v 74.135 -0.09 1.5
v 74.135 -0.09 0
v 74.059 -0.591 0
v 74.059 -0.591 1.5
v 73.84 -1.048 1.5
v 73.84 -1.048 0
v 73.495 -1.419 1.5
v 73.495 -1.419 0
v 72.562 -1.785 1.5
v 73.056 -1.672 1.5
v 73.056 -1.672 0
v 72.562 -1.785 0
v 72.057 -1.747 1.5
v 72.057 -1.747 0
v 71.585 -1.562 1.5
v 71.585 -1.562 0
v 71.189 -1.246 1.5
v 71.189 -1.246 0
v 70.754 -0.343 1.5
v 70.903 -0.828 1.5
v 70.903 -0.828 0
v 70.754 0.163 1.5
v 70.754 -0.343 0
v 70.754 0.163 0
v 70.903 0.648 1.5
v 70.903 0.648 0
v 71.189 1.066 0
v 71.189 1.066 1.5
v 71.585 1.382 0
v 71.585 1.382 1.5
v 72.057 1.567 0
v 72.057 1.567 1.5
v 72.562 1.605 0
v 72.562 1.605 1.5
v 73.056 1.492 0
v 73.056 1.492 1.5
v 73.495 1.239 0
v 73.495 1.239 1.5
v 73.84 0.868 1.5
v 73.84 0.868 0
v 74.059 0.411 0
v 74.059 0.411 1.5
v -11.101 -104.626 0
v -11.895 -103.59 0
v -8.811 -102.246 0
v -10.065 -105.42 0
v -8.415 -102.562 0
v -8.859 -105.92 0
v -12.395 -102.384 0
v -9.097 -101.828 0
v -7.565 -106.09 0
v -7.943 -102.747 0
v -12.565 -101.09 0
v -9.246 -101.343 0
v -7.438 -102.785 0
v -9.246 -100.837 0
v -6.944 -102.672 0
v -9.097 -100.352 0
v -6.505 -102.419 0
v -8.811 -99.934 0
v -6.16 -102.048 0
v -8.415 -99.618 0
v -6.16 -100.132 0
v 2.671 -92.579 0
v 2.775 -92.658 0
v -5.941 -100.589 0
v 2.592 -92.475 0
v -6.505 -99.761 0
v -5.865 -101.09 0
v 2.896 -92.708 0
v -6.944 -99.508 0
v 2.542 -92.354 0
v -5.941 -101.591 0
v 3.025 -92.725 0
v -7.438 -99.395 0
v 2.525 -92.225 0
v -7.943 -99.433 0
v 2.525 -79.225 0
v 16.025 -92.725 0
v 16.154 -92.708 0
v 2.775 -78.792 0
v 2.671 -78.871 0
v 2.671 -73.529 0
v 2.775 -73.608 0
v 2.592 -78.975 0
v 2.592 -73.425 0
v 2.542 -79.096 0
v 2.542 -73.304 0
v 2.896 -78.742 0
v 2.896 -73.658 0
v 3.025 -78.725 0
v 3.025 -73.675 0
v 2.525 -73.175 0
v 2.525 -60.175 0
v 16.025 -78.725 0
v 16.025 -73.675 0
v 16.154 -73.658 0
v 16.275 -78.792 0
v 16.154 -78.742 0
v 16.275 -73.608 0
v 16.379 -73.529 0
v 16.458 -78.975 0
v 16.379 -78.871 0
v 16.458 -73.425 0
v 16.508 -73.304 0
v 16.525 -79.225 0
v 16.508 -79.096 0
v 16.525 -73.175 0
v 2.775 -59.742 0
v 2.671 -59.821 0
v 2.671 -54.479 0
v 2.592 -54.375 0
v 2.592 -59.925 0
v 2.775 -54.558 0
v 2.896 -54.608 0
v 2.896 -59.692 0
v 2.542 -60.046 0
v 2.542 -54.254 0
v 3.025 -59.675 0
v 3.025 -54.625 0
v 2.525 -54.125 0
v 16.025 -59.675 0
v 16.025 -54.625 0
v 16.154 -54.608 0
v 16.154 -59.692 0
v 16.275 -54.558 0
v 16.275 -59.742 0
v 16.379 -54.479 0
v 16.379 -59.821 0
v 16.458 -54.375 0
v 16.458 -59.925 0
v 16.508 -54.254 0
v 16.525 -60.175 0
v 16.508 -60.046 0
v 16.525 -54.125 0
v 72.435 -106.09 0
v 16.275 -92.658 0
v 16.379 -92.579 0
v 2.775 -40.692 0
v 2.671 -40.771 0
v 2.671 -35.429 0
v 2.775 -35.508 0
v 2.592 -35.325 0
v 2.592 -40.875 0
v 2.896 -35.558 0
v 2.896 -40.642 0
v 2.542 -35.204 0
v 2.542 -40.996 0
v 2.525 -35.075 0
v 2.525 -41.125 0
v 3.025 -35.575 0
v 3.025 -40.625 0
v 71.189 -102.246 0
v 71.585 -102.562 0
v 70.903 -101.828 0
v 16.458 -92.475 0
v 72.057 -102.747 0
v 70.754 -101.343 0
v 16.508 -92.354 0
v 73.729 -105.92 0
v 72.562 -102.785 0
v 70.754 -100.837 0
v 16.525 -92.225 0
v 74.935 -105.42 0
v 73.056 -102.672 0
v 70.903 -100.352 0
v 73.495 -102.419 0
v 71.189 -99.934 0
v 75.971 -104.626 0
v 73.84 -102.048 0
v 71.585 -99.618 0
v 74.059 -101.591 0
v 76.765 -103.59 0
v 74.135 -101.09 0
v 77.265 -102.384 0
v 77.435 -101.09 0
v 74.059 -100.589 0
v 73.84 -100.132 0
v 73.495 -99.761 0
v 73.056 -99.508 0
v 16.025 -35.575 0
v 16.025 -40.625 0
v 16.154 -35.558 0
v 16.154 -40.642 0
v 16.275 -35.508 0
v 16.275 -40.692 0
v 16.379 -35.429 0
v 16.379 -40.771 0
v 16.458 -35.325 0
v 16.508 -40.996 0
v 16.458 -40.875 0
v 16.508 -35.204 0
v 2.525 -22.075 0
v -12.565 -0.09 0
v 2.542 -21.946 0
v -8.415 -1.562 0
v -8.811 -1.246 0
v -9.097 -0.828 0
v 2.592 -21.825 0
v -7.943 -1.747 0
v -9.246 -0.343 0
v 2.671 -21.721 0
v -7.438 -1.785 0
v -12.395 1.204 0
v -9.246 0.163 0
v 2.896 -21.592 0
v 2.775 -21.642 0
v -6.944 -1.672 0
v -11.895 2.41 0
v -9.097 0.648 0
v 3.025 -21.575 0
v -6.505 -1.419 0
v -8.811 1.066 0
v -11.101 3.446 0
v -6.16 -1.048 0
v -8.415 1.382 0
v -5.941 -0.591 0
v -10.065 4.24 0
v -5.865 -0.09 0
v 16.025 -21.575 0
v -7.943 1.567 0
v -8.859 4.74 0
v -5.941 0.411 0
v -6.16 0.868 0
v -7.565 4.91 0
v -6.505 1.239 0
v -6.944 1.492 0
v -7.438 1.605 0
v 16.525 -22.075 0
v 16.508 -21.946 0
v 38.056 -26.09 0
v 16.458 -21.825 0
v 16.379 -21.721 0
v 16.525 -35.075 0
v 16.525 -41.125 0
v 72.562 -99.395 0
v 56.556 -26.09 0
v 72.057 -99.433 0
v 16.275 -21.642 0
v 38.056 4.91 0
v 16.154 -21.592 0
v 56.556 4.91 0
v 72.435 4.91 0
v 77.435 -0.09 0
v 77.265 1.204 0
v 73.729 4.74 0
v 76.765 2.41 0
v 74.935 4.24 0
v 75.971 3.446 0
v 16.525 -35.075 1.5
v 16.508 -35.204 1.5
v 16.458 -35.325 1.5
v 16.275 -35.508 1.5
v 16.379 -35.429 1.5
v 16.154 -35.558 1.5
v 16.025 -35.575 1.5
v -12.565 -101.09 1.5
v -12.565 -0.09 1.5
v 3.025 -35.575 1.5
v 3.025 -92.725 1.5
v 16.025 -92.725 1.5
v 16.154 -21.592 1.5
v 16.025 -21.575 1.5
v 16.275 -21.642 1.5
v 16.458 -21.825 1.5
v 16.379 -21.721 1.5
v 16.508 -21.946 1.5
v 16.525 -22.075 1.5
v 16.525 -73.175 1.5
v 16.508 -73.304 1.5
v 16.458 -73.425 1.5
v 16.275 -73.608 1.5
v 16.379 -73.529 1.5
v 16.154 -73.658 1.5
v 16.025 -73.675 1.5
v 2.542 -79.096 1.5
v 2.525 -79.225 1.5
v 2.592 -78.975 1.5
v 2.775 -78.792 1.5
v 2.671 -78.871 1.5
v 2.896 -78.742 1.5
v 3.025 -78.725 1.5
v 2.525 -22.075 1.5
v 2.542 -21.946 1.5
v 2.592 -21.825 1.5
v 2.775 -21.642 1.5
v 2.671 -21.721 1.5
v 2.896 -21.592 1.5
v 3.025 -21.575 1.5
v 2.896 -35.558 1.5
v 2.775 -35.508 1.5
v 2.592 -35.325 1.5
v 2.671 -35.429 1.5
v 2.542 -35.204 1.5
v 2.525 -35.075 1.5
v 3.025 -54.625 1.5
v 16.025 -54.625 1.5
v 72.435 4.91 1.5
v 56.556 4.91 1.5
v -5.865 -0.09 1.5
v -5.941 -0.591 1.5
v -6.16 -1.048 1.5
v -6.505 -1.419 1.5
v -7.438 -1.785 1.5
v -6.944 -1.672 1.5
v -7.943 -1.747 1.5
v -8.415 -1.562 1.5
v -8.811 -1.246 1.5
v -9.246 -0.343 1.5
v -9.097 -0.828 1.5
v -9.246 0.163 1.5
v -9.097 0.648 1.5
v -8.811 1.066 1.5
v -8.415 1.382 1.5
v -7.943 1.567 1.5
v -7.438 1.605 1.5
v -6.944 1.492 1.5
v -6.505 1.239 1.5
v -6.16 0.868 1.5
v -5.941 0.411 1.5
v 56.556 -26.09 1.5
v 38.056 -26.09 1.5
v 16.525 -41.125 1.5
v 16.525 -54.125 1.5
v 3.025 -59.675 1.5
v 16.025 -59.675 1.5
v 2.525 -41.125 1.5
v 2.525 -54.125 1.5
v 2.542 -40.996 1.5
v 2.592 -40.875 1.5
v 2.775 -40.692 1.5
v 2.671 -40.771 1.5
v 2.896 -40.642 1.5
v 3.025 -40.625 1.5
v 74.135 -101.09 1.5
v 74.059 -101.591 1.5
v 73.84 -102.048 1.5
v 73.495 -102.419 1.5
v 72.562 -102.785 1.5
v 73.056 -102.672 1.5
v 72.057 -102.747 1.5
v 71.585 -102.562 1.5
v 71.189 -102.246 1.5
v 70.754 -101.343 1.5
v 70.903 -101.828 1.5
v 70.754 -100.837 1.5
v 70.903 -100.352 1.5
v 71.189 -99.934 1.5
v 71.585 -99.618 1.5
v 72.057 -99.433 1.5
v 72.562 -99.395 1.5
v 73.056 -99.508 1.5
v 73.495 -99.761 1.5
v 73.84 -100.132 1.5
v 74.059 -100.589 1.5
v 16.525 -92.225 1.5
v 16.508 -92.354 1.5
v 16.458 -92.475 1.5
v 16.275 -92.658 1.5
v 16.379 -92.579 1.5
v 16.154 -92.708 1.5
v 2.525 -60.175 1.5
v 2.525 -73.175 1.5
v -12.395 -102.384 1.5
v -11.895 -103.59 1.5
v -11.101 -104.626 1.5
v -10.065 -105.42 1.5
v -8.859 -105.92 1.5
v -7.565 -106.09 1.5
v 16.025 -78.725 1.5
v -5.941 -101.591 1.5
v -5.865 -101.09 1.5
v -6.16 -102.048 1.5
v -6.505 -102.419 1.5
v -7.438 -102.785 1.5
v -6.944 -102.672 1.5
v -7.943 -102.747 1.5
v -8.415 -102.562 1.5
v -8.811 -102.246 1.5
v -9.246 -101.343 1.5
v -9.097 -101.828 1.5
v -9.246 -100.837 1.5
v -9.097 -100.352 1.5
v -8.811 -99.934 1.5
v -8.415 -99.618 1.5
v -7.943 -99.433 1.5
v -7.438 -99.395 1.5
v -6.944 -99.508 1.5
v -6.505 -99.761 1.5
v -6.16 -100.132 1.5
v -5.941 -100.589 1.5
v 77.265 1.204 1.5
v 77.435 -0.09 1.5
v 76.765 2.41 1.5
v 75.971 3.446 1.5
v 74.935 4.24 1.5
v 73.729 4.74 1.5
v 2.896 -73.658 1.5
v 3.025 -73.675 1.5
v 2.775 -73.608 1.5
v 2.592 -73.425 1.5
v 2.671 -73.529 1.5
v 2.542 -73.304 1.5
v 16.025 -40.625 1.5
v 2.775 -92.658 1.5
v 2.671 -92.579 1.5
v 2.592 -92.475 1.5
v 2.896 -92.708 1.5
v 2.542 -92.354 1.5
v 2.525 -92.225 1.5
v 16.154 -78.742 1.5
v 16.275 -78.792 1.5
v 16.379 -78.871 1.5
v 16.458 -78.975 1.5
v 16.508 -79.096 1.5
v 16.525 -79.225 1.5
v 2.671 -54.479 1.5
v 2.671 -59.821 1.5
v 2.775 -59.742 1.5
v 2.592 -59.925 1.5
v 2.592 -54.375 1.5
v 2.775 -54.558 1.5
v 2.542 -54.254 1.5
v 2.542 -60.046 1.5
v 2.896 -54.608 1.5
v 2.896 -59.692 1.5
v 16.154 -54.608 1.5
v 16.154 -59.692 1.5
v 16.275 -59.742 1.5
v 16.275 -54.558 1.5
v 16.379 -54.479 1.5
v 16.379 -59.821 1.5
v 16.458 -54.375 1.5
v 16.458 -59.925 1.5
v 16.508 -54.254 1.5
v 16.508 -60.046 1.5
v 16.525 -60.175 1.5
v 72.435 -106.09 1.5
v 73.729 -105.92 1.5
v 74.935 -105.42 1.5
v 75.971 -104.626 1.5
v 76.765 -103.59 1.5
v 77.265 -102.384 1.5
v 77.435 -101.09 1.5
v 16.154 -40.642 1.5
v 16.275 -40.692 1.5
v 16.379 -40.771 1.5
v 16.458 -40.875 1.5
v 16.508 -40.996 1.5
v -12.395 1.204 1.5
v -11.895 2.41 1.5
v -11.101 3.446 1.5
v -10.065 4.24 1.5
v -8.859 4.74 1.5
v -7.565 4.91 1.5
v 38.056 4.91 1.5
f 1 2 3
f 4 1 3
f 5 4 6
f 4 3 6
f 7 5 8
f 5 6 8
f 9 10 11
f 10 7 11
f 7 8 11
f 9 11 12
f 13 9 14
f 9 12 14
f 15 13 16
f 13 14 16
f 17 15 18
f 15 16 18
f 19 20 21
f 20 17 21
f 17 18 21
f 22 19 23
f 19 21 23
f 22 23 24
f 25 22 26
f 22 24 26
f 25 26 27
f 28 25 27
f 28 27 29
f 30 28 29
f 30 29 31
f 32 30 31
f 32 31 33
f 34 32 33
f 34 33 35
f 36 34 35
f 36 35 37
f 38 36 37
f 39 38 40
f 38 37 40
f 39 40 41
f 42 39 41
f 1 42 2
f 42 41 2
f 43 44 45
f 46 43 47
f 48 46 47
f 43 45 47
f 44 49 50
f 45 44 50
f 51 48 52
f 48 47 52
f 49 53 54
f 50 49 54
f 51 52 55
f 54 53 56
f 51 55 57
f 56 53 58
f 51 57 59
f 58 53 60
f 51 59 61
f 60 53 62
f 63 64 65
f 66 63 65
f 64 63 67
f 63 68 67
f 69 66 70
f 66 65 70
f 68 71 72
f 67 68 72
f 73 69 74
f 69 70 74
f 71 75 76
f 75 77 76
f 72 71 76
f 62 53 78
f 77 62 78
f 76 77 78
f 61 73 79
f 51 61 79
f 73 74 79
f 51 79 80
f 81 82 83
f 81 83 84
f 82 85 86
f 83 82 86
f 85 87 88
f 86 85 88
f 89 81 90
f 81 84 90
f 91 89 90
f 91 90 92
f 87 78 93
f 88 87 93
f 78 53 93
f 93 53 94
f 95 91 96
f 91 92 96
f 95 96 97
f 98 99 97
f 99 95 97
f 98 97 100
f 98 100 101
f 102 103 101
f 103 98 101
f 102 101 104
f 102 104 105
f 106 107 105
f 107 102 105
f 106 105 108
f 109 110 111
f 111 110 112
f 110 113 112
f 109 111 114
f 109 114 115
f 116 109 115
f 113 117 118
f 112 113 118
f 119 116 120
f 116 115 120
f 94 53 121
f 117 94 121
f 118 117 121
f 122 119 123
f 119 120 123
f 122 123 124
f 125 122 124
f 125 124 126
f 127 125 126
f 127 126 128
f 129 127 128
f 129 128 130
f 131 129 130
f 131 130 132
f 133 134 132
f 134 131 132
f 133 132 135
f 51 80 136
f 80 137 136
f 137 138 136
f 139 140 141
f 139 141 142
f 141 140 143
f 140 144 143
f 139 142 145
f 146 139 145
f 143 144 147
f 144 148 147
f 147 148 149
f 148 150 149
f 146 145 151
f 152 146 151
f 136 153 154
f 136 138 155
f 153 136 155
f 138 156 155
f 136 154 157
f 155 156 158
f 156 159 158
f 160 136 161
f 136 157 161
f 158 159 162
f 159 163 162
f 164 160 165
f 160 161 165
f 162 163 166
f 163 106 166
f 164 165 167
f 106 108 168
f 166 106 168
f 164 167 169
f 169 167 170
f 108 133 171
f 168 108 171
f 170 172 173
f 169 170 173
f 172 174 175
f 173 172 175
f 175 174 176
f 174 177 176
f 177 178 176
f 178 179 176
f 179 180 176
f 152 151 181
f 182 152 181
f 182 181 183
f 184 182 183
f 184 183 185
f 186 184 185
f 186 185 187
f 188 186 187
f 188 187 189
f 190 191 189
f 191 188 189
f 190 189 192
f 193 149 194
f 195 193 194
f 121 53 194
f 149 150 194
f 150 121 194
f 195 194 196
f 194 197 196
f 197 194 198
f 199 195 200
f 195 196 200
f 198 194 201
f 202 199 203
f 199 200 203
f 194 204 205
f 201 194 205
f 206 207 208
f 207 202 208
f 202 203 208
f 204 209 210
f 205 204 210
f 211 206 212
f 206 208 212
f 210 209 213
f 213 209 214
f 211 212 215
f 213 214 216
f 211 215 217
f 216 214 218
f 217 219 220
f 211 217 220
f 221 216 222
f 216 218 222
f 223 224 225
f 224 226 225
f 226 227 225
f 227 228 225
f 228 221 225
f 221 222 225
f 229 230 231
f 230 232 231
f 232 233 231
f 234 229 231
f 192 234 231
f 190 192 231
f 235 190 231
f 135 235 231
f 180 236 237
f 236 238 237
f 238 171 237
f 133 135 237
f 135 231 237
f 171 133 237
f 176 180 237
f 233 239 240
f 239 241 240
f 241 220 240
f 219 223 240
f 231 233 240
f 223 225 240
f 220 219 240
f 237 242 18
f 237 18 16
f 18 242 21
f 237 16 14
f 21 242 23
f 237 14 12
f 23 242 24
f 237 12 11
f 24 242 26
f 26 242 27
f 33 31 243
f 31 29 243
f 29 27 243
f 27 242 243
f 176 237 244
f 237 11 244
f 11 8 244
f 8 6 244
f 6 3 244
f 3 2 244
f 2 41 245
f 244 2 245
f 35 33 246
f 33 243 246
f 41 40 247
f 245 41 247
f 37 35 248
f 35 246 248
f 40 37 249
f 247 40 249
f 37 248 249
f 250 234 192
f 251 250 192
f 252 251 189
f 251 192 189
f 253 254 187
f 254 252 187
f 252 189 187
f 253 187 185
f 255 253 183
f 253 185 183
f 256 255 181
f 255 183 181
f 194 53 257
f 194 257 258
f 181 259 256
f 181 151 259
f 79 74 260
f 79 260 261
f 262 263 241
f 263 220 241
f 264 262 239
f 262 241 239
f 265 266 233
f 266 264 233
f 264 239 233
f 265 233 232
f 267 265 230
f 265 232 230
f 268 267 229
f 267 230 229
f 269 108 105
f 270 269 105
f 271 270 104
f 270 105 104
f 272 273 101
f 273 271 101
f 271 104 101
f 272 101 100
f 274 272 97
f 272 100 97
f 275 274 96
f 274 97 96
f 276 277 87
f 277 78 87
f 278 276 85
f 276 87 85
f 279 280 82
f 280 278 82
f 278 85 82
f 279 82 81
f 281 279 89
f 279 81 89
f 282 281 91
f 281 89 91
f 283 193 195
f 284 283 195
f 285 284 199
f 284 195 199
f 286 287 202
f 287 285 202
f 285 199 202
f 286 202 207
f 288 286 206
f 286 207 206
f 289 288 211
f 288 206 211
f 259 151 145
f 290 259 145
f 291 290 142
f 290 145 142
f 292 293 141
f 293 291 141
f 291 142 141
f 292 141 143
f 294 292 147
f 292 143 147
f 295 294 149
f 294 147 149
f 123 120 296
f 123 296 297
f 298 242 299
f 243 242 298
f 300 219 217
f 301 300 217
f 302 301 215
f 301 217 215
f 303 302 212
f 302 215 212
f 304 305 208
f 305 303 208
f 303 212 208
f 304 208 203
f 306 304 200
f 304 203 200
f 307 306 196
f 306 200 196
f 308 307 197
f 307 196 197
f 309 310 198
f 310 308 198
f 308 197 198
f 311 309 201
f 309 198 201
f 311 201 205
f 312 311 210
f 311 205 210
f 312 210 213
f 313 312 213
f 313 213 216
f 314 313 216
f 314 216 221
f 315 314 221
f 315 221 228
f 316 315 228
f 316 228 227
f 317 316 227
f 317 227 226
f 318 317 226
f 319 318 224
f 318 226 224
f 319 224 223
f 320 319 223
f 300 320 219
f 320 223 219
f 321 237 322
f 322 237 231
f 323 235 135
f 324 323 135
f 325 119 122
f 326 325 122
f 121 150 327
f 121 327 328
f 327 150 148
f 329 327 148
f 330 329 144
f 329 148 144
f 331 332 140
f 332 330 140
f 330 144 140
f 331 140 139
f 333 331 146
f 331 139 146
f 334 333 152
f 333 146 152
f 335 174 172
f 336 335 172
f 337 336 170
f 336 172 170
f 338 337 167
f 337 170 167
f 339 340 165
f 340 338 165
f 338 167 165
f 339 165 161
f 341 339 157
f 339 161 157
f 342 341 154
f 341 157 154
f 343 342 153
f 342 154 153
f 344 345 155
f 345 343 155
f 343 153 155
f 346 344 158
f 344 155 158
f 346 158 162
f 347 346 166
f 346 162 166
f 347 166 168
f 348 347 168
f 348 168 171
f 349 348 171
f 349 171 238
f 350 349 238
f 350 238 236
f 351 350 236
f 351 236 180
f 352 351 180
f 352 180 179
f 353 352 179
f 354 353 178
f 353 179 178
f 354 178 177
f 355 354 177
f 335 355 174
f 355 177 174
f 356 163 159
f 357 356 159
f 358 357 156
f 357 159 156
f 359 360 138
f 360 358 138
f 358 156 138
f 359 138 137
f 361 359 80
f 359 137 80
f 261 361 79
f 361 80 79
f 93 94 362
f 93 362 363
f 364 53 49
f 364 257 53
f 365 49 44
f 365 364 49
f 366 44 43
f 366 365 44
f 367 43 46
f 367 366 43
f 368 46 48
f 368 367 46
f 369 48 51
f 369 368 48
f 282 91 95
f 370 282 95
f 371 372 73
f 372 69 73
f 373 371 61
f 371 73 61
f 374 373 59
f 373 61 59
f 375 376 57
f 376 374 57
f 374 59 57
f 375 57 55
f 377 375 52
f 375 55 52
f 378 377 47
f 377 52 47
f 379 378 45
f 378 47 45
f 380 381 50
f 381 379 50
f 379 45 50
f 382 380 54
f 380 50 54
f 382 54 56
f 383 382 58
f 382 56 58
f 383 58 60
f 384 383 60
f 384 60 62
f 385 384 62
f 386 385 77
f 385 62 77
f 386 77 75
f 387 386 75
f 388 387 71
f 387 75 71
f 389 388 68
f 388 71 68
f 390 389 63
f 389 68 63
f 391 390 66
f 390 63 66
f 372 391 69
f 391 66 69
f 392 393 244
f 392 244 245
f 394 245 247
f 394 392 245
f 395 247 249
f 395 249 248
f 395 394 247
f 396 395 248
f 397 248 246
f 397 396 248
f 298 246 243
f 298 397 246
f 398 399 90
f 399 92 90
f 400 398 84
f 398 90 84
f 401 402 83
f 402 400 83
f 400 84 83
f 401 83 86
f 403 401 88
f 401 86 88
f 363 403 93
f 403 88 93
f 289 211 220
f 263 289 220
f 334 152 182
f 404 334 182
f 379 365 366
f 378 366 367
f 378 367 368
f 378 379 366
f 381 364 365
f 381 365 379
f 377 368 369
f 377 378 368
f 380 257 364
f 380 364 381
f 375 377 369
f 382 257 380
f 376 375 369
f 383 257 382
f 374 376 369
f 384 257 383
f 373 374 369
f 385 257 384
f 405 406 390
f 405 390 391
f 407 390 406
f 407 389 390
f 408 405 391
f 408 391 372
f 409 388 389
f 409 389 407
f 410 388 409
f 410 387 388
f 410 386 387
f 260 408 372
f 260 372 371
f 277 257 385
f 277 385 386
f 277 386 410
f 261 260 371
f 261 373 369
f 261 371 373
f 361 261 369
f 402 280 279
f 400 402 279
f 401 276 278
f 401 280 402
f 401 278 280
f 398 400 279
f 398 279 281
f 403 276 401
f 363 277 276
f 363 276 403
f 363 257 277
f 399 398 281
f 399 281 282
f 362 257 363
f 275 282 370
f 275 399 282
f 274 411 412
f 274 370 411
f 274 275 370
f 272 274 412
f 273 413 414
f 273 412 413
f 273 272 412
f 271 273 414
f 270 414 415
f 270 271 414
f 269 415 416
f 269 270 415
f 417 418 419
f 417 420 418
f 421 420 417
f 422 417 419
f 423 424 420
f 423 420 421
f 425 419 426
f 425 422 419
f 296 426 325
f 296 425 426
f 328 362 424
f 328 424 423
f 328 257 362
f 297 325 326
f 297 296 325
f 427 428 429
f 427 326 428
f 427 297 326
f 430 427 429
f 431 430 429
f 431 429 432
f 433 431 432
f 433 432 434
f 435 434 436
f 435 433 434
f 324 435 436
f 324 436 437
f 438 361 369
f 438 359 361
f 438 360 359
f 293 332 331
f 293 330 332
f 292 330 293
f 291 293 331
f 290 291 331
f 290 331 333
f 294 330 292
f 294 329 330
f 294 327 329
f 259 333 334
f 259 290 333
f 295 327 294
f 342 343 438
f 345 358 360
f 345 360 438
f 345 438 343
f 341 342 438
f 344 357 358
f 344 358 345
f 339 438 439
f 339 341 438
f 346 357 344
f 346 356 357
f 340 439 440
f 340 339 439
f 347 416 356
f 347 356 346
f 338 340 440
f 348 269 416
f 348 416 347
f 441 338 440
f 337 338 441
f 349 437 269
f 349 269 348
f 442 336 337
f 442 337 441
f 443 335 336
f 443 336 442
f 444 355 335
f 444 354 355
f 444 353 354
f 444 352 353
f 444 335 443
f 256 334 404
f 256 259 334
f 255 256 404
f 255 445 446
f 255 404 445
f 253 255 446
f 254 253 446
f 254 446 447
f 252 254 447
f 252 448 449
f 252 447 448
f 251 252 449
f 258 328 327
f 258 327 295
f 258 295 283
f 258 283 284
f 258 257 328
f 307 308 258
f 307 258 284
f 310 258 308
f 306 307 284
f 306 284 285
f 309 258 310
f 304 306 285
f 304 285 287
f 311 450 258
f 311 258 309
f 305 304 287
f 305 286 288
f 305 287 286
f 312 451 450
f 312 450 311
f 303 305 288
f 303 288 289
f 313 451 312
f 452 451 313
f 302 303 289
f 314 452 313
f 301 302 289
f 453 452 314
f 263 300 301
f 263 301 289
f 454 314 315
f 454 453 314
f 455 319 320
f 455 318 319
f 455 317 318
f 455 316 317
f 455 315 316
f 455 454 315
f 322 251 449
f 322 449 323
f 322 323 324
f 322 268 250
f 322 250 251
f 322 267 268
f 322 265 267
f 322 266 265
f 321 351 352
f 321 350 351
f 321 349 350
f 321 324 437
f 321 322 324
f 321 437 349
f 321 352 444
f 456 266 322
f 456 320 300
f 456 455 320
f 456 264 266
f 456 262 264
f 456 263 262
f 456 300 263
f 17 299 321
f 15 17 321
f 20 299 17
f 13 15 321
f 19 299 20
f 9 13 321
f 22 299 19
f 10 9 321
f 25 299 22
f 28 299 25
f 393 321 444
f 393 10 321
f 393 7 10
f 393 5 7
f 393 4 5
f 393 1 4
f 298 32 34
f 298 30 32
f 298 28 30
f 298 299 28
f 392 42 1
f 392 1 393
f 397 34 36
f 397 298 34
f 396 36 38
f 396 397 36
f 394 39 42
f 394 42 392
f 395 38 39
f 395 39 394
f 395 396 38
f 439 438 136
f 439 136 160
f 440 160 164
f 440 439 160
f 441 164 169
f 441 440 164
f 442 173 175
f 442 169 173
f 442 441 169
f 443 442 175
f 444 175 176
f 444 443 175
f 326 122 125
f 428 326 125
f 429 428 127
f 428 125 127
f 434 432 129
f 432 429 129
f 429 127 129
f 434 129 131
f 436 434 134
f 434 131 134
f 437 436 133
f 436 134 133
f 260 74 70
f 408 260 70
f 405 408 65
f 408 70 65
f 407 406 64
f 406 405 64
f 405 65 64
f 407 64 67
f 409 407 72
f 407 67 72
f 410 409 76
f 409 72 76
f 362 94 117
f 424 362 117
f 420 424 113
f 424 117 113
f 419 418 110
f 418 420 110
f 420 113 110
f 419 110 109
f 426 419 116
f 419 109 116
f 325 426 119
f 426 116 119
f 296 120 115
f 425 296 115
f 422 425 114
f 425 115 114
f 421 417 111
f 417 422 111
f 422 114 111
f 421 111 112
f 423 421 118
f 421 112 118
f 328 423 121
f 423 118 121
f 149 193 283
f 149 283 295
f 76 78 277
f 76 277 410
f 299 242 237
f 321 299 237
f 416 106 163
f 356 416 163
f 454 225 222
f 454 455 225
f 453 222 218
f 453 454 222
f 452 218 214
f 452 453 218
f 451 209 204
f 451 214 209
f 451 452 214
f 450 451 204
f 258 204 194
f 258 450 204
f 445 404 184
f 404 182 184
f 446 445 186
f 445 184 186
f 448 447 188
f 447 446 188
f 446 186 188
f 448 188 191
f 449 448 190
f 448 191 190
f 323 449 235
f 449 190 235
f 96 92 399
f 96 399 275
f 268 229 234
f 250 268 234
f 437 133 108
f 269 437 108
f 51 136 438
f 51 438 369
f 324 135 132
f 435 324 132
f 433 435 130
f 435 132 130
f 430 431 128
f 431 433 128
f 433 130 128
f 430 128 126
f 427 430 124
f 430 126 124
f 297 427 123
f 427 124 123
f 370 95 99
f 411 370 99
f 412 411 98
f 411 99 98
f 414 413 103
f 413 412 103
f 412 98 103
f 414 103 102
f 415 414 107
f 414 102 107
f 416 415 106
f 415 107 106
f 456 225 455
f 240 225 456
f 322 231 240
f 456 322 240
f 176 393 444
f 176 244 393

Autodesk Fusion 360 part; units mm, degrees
sketch "plate-2026-01-10T16_34_53.983Z" plane through (0, 0, 0) normal (0, 0, 1) x (1, 0, 0)
  line L0 (3.025, -21.575) -> (16.025, -21.575)
  line L1 (3.025, -35.575) -> (16.025, -35.575)
  line L2 (2.525, -22.075) -> (2.525, -35.075)
  line L3 (16.525, -22.075) -> (16.525, -35.075)
  arc A0 (3.025, -21.575) -> (2.525, -22.075) centre (3.025, -22.075) ccw
  arc A1 (16.525, -22.075) -> (16.025, -21.575) centre (16.025, -22.075) ccw
  arc A2 (2.525, -35.075) -> (3.025, -35.575) centre (3.025, -35.075) ccw
  arc A3 (16.025, -35.575) -> (16.525, -35.075) centre (16.025, -35.075) ccw
  line L4 (3.025, -40.625) -> (16.025, -40.625)
  line L5 (3.025, -54.625) -> (16.025, -54.625)
  line L6 (2.525, -41.125) -> (2.525, -54.125)
  line L7 (16.525, -41.125) -> (16.525, -54.125)
  arc A4 (3.025, -40.625) -> (2.525, -41.125) centre (3.025, -41.125) ccw
  arc A5 (16.525, -41.125) -> (16.025, -40.625) centre (16.025, -41.125) ccw
  arc A6 (2.525, -54.125) -> (3.025, -54.625) centre (3.025, -54.125) ccw
  arc A7 (16.025, -54.625) -> (16.525, -54.125) centre (16.025, -54.125) ccw
  line L8 (3.025, -59.675) -> (16.025, -59.675)
  line L9 (3.025, -73.675) -> (16.025, -73.675)
  line L10 (2.525, -60.175) -> (2.525, -73.175)
  line L11 (16.525, -60.175) -> (16.525, -73.175)
  arc A8 (3.025, -59.675) -> (2.525, -60.175) centre (3.025, -60.175) ccw
  arc A9 (16.525, -60.175) -> (16.025, -59.675) centre (16.025, -60.175) ccw
  arc A10 (2.525, -73.175) -> (3.025, -73.675) centre (3.025, -73.175) ccw
  arc A11 (16.025, -73.675) -> (16.525, -73.175) centre (16.025, -73.175) ccw
  line L12 (3.025, -78.725) -> (16.025, -78.725)
  line L13 (3.025, -92.725) -> (16.025, -92.725)
  line L14 (2.525, -79.225) -> (2.525, -92.225)
  line L15 (16.525, -79.225) -> (16.525, -92.225)
  arc A12 (3.025, -78.725) -> (2.525, -79.225) centre (3.025, -79.225) ccw
  arc A13 (16.525, -79.225) -> (16.025, -78.725) centre (16.025, -79.225) ccw
  arc A14 (2.525, -92.225) -> (3.025, -92.725) centre (3.025, -92.225) ccw
  arc A15 (16.025, -92.725) -> (16.525, -92.225) centre (16.025, -92.225) ccw
  line L16 (-12.565, 4.91) -> (77.435, 4.91)
  line L17 (77.435, 4.91) -> (77.435, -106.09)
  line L18 (77.435, -106.09) -> (-12.565, -106.09)
  line L19 (-12.565, -106.09) -> (-12.565, 4.91)
  line L20 (38.056, 4.91) -> (56.556, 4.91)
  line L21 (56.556, 4.91) -> (56.556, -26.09)
  line L22 (56.556, -26.09) -> (38.056, -26.09)
  line L23 (38.056, -26.09) -> (38.056, 4.91)
  circle A16 centre (-7.565, -101.09) radius 1.7
  circle A17 centre (72.435, -101.09) radius 1.7
  circle A18 centre (72.435, -0.09) radius 1.7
  circle A19 centre (-7.565, -0.09) radius 1.7
  dimension "d1" = 111
  dimension "d2" = 90
  dimension "d3" = 15.09
  dimension "d4" = 13.365
  dimension "d5" = 18.5
  dimension "d6" = 31
  dimension "d7" = 50.621
  dimension "d8" = 3.4
  dimension "d9" = 5
  dimension "d10" = 5
  dimension "d11" = 3.4
  dimension "d12" = 5
  dimension "d13" = 5
  dimension "d14" = 3.4
  dimension "d15" = 5
  dimension "d16" = 5
  dimension "d17" = 3.4
  dimension "d18" = 5
  dimension "d19" = 5
sketch "Sketch2" plane through (0, 0, 0) normal (0, 0, 1) x (1, 0, 0)
sketch "Sketch3" plane through (0, 0, 0) normal (0, 0, 1) x (1, 0, 0)
extrude "Extrude1" add sketch "plate-2026-01-10T16_34_53.983Z" along normal blind 1.5 contours L16 L17 L18 L19 L21 L22 L23
fillet "Fillet1" radius 5 1 edges at (77.435, -106.09, 0.75)
fillet "Fillet2" radius 5 1 edges at (77.435, 4.91, 0.75)
fillet "Fillet3" radius 5 1 edges at (-12.565, 4.91, 0.75)
fillet "Fillet4" radius 5 1 edges at (-12.565, -106.09, 0.75)
